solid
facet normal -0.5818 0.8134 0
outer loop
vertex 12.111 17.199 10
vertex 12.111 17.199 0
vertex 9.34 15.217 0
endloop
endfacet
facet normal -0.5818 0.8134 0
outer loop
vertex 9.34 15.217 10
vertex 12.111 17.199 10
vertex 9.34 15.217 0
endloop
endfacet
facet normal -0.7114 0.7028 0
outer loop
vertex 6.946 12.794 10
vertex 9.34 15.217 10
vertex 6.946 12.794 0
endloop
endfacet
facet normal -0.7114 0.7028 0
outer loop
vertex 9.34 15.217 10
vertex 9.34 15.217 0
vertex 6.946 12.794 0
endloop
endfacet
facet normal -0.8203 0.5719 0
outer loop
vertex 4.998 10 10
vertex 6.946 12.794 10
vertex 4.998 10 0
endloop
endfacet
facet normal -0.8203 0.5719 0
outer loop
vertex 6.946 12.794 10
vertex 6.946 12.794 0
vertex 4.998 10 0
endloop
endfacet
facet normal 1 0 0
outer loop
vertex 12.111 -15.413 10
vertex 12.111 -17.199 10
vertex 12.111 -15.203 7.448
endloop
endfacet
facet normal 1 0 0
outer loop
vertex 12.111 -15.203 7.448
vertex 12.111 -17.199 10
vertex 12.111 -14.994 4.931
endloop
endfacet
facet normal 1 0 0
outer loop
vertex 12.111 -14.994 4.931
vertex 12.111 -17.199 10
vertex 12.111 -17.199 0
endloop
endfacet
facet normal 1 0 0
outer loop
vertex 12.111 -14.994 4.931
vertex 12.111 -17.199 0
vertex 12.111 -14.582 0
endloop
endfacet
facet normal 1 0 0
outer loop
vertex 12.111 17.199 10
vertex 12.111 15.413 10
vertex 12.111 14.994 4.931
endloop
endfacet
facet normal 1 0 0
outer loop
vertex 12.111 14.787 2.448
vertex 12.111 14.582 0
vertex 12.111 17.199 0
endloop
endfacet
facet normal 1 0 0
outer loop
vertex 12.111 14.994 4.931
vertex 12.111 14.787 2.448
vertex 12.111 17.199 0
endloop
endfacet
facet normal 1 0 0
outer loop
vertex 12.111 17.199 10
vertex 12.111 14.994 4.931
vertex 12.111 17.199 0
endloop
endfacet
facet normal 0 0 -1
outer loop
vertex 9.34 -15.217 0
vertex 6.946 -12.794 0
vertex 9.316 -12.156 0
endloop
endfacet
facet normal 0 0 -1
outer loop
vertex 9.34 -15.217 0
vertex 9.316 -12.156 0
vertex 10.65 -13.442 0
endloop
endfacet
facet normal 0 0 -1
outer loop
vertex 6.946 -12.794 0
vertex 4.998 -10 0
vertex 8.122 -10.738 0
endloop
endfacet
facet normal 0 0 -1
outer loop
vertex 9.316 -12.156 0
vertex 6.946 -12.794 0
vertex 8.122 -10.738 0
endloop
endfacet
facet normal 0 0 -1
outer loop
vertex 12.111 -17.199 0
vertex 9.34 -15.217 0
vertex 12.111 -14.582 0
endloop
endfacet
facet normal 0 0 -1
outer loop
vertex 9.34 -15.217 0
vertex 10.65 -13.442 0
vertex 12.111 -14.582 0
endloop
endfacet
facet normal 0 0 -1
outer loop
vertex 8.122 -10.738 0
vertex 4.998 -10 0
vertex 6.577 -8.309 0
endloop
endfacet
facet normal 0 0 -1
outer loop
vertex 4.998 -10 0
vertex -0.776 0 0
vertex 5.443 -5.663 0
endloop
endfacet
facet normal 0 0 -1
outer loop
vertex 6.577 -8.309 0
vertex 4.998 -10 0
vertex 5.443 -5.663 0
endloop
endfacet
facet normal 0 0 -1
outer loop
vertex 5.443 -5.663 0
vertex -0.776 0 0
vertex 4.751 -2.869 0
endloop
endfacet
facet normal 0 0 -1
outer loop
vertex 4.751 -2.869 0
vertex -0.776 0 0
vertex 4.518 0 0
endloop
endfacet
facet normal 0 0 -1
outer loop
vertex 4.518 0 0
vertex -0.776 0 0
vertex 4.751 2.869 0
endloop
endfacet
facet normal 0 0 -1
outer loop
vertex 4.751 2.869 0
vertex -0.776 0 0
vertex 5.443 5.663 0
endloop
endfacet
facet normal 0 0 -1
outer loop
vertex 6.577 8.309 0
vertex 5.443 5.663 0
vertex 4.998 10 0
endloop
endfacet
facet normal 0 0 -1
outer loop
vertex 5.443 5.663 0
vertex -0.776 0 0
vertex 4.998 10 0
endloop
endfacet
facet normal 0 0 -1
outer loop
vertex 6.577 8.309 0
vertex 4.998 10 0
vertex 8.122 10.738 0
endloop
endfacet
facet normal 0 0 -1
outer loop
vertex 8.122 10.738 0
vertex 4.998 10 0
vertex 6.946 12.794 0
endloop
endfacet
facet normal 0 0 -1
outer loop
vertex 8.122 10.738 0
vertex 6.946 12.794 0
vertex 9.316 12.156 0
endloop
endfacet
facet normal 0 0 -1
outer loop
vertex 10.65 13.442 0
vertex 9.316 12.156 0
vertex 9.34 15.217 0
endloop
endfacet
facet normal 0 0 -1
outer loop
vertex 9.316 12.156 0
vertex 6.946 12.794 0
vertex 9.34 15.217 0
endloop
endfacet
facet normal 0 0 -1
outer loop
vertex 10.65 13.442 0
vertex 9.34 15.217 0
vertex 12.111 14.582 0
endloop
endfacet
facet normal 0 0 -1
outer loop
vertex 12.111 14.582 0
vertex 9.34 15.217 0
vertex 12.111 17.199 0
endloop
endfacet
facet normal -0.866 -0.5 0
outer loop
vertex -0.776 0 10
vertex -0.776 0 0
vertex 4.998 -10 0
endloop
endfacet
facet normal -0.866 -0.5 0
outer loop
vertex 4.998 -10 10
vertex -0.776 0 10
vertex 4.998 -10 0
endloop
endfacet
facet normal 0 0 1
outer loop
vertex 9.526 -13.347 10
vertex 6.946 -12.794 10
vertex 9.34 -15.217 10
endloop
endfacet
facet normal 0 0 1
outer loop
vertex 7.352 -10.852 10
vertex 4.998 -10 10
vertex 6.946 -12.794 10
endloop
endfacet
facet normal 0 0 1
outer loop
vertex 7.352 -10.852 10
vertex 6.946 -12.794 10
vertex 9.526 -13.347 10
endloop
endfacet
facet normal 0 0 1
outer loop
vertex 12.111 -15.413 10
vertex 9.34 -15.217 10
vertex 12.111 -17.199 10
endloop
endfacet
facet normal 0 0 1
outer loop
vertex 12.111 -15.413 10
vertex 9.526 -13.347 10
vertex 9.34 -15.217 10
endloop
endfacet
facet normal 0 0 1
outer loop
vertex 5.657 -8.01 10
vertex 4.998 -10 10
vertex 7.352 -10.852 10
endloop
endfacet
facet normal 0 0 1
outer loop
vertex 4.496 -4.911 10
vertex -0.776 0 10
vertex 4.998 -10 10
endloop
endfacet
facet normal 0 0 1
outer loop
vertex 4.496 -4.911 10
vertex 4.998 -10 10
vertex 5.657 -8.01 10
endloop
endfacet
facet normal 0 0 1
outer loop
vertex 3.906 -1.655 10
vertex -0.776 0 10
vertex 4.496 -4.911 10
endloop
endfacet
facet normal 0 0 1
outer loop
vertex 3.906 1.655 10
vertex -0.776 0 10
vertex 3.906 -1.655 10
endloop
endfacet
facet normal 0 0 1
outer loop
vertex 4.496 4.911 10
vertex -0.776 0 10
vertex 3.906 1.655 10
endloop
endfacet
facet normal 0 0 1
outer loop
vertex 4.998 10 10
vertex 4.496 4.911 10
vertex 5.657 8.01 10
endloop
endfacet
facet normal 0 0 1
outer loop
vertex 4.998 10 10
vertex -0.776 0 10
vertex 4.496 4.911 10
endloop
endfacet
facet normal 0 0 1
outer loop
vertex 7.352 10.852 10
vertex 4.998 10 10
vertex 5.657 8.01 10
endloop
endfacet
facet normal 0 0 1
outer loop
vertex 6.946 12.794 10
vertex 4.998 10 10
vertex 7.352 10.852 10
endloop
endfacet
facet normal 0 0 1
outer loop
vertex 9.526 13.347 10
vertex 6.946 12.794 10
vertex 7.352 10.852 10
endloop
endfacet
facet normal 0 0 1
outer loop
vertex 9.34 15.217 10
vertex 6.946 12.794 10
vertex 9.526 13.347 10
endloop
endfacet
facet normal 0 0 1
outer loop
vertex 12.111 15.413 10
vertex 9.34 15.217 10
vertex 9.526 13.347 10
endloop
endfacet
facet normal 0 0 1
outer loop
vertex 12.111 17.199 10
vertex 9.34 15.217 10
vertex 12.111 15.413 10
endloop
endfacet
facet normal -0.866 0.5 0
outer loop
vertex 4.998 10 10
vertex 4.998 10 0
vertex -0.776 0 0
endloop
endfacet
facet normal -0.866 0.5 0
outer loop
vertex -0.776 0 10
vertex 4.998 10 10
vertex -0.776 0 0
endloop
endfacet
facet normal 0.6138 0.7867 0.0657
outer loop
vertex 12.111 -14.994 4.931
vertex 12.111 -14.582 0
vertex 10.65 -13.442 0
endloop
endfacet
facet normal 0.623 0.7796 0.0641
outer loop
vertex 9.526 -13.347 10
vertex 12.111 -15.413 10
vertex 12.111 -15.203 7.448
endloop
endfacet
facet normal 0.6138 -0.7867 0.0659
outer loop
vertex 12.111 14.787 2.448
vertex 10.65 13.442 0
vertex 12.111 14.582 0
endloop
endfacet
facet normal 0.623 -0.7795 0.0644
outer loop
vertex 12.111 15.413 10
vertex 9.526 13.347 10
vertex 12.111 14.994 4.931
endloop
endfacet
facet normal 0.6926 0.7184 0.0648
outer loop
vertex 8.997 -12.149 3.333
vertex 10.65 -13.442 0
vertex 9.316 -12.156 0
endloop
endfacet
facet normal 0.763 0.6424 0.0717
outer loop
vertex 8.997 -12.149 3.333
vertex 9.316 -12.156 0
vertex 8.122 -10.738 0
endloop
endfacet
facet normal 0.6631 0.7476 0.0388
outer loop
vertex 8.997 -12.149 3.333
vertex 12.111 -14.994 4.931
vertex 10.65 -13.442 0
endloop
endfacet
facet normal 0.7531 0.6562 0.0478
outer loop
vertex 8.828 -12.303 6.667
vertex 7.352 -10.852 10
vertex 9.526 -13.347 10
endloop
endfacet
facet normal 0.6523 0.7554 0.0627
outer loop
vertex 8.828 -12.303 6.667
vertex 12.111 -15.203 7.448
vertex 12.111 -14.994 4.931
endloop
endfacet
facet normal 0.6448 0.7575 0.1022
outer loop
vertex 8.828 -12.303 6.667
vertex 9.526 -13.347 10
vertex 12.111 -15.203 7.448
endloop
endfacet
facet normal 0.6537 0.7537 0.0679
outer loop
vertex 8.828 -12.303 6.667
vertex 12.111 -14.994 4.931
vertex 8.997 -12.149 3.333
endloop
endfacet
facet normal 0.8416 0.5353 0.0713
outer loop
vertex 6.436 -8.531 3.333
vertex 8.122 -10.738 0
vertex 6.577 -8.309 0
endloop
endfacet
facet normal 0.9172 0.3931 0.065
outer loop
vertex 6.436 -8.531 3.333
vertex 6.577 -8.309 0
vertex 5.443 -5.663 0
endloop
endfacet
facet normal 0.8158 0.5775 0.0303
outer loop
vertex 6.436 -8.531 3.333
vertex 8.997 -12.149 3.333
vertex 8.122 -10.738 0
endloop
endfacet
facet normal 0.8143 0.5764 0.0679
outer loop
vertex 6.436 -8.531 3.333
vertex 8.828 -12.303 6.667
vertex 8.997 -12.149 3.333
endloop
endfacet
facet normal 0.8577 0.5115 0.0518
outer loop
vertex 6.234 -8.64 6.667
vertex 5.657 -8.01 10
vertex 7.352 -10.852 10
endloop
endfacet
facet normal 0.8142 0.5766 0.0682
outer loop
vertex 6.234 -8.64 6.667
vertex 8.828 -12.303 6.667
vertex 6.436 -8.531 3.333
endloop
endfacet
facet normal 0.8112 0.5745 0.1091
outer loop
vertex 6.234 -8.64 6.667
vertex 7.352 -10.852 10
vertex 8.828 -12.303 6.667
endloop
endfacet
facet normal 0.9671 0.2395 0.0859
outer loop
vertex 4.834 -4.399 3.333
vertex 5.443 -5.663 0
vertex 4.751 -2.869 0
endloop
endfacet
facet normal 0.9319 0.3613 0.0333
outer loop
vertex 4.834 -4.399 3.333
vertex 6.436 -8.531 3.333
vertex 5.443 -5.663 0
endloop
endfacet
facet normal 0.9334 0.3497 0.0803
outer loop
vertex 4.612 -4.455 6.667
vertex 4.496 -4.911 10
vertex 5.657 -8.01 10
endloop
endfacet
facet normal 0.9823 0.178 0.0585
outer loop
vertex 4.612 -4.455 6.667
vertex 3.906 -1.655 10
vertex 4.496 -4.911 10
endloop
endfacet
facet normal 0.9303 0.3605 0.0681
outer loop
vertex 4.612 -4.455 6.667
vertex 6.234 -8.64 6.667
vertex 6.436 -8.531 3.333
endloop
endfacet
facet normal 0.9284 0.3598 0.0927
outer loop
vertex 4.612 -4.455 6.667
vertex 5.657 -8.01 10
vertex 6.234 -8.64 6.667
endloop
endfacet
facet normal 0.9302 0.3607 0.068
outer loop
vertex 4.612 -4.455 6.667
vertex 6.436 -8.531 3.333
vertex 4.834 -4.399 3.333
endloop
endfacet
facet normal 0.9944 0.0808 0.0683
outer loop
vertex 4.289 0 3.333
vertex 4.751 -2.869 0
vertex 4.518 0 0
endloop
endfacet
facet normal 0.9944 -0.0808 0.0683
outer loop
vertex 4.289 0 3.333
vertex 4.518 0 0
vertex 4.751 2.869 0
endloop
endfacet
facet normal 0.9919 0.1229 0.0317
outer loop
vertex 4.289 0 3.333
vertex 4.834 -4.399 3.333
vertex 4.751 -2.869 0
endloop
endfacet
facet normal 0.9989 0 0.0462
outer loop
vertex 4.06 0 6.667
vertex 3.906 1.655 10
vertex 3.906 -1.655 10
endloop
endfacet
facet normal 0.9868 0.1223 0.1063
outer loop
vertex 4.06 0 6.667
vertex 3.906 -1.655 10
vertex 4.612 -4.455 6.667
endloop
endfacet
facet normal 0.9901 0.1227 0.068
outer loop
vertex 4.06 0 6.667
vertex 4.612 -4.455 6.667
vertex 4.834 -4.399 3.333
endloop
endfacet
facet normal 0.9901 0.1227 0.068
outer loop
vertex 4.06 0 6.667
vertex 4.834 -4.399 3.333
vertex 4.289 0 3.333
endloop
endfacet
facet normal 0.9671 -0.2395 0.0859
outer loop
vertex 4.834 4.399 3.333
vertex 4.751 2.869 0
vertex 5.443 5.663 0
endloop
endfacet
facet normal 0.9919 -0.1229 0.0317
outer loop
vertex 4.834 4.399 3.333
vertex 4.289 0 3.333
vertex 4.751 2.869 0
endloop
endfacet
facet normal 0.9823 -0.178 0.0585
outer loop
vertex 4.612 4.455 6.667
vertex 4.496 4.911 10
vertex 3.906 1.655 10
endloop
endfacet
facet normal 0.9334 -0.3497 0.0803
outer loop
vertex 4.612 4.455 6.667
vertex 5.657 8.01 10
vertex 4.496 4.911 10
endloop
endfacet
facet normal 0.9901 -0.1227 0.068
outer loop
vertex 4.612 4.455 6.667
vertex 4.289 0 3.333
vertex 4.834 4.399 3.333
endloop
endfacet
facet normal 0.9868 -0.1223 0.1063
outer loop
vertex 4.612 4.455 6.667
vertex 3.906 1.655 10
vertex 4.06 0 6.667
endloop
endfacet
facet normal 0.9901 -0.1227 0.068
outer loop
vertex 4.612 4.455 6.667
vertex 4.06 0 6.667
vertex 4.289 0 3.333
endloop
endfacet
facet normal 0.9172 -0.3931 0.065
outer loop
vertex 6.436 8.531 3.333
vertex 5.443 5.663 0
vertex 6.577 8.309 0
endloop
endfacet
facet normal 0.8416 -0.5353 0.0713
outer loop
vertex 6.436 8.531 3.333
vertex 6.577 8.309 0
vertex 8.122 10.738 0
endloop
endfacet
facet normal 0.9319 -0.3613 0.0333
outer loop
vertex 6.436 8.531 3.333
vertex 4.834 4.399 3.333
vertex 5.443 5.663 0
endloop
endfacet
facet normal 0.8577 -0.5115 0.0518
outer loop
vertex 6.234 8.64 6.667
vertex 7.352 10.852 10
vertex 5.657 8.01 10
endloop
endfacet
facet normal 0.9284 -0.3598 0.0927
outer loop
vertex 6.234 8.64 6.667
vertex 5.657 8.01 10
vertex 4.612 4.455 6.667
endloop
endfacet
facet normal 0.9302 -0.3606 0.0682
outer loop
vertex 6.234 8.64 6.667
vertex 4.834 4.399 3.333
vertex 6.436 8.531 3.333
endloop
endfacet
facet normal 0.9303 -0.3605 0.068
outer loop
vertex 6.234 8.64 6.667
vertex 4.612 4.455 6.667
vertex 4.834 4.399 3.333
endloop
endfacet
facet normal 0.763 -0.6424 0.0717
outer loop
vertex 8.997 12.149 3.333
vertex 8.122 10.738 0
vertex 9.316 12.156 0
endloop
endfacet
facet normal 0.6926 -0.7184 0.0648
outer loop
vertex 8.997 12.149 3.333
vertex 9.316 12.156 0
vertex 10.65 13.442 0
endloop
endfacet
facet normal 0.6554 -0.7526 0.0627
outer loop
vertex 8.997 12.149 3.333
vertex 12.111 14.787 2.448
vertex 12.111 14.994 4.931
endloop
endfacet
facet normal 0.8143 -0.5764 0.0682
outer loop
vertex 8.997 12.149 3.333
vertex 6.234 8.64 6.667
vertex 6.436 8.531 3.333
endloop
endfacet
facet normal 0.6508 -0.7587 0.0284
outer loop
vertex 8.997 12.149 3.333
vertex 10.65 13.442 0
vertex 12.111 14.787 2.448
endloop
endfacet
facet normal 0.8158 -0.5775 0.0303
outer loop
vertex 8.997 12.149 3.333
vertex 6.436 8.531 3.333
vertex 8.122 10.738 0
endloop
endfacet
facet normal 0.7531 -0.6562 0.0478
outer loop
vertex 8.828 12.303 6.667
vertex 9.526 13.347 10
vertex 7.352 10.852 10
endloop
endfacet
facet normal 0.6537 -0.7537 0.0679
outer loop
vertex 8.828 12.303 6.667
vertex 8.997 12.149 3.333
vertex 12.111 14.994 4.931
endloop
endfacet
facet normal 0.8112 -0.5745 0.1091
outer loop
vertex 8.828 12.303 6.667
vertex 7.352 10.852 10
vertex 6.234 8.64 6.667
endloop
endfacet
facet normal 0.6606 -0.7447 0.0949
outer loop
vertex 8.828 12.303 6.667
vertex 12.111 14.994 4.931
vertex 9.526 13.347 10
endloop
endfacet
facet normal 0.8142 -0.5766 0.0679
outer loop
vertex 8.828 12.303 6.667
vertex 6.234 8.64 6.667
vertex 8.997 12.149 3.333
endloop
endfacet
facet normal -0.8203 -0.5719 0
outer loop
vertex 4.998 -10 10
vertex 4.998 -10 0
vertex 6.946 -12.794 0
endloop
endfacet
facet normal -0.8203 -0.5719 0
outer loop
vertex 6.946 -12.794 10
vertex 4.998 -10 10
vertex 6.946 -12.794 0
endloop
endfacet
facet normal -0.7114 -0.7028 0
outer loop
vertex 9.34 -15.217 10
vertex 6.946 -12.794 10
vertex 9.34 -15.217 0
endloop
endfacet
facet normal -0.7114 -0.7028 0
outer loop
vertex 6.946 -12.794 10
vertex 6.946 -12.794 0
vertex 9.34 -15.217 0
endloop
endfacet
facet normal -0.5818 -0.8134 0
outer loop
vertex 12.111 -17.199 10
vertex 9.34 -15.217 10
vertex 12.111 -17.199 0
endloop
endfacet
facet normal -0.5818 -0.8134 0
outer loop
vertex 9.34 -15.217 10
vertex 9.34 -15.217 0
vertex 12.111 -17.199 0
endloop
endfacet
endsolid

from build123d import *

# Parameters (mm, degrees)
EXTRUDE_1_DEPTH = 10


with BuildPart() as part:
    # 草图1 → 凸台-拉伸1 (new body)
    with BuildSketch(Plane.XY):
        with BuildLine():
            Line((12.110887706, 14.582382064), (12.110887706, 17.199007723))
            ThreePointArc((12.110887706, 17.199007723), (8.091530741, 14.056850277), (4.997932444, 10.000000095))
            Line((4.997932444, 10.000000095), (-0.775570302, 0))
            Line((-0.775570302, 0), (4.99793245, -10.000000104))
            ThreePointArc((4.99793245, -10.000000104), (8.091530745, -14.056850281), (12.110887706, -17.199007723))
            Line((12.110887706, -17.199007723), (12.110887706, -14.582382064))
            ThreePointArc((12.110887706, -14.582382064), (4.518440465, 0), (12.110887706, 14.582382064))
        make_face()
    extrude(amount=EXTRUDE_1_DEPTH)

    # 草图2 → 切除-旋转1 (revolve, cut)
    with BuildSketch(Plane(origin=(0, 0, 0), x_dir=(0, 0, -1), z_dir=(0, -1, 0))):
        Polygon((0, 22.318440465), (0, 4.518440465), (-10, 3.831448348), (-10, 22.318440465), align=None)
    revolve(axis=Axis((22.318440465, 0, 18.306126046), (0, 0, -1)), mode=Mode.SUBTRACT)


solid = part.part
